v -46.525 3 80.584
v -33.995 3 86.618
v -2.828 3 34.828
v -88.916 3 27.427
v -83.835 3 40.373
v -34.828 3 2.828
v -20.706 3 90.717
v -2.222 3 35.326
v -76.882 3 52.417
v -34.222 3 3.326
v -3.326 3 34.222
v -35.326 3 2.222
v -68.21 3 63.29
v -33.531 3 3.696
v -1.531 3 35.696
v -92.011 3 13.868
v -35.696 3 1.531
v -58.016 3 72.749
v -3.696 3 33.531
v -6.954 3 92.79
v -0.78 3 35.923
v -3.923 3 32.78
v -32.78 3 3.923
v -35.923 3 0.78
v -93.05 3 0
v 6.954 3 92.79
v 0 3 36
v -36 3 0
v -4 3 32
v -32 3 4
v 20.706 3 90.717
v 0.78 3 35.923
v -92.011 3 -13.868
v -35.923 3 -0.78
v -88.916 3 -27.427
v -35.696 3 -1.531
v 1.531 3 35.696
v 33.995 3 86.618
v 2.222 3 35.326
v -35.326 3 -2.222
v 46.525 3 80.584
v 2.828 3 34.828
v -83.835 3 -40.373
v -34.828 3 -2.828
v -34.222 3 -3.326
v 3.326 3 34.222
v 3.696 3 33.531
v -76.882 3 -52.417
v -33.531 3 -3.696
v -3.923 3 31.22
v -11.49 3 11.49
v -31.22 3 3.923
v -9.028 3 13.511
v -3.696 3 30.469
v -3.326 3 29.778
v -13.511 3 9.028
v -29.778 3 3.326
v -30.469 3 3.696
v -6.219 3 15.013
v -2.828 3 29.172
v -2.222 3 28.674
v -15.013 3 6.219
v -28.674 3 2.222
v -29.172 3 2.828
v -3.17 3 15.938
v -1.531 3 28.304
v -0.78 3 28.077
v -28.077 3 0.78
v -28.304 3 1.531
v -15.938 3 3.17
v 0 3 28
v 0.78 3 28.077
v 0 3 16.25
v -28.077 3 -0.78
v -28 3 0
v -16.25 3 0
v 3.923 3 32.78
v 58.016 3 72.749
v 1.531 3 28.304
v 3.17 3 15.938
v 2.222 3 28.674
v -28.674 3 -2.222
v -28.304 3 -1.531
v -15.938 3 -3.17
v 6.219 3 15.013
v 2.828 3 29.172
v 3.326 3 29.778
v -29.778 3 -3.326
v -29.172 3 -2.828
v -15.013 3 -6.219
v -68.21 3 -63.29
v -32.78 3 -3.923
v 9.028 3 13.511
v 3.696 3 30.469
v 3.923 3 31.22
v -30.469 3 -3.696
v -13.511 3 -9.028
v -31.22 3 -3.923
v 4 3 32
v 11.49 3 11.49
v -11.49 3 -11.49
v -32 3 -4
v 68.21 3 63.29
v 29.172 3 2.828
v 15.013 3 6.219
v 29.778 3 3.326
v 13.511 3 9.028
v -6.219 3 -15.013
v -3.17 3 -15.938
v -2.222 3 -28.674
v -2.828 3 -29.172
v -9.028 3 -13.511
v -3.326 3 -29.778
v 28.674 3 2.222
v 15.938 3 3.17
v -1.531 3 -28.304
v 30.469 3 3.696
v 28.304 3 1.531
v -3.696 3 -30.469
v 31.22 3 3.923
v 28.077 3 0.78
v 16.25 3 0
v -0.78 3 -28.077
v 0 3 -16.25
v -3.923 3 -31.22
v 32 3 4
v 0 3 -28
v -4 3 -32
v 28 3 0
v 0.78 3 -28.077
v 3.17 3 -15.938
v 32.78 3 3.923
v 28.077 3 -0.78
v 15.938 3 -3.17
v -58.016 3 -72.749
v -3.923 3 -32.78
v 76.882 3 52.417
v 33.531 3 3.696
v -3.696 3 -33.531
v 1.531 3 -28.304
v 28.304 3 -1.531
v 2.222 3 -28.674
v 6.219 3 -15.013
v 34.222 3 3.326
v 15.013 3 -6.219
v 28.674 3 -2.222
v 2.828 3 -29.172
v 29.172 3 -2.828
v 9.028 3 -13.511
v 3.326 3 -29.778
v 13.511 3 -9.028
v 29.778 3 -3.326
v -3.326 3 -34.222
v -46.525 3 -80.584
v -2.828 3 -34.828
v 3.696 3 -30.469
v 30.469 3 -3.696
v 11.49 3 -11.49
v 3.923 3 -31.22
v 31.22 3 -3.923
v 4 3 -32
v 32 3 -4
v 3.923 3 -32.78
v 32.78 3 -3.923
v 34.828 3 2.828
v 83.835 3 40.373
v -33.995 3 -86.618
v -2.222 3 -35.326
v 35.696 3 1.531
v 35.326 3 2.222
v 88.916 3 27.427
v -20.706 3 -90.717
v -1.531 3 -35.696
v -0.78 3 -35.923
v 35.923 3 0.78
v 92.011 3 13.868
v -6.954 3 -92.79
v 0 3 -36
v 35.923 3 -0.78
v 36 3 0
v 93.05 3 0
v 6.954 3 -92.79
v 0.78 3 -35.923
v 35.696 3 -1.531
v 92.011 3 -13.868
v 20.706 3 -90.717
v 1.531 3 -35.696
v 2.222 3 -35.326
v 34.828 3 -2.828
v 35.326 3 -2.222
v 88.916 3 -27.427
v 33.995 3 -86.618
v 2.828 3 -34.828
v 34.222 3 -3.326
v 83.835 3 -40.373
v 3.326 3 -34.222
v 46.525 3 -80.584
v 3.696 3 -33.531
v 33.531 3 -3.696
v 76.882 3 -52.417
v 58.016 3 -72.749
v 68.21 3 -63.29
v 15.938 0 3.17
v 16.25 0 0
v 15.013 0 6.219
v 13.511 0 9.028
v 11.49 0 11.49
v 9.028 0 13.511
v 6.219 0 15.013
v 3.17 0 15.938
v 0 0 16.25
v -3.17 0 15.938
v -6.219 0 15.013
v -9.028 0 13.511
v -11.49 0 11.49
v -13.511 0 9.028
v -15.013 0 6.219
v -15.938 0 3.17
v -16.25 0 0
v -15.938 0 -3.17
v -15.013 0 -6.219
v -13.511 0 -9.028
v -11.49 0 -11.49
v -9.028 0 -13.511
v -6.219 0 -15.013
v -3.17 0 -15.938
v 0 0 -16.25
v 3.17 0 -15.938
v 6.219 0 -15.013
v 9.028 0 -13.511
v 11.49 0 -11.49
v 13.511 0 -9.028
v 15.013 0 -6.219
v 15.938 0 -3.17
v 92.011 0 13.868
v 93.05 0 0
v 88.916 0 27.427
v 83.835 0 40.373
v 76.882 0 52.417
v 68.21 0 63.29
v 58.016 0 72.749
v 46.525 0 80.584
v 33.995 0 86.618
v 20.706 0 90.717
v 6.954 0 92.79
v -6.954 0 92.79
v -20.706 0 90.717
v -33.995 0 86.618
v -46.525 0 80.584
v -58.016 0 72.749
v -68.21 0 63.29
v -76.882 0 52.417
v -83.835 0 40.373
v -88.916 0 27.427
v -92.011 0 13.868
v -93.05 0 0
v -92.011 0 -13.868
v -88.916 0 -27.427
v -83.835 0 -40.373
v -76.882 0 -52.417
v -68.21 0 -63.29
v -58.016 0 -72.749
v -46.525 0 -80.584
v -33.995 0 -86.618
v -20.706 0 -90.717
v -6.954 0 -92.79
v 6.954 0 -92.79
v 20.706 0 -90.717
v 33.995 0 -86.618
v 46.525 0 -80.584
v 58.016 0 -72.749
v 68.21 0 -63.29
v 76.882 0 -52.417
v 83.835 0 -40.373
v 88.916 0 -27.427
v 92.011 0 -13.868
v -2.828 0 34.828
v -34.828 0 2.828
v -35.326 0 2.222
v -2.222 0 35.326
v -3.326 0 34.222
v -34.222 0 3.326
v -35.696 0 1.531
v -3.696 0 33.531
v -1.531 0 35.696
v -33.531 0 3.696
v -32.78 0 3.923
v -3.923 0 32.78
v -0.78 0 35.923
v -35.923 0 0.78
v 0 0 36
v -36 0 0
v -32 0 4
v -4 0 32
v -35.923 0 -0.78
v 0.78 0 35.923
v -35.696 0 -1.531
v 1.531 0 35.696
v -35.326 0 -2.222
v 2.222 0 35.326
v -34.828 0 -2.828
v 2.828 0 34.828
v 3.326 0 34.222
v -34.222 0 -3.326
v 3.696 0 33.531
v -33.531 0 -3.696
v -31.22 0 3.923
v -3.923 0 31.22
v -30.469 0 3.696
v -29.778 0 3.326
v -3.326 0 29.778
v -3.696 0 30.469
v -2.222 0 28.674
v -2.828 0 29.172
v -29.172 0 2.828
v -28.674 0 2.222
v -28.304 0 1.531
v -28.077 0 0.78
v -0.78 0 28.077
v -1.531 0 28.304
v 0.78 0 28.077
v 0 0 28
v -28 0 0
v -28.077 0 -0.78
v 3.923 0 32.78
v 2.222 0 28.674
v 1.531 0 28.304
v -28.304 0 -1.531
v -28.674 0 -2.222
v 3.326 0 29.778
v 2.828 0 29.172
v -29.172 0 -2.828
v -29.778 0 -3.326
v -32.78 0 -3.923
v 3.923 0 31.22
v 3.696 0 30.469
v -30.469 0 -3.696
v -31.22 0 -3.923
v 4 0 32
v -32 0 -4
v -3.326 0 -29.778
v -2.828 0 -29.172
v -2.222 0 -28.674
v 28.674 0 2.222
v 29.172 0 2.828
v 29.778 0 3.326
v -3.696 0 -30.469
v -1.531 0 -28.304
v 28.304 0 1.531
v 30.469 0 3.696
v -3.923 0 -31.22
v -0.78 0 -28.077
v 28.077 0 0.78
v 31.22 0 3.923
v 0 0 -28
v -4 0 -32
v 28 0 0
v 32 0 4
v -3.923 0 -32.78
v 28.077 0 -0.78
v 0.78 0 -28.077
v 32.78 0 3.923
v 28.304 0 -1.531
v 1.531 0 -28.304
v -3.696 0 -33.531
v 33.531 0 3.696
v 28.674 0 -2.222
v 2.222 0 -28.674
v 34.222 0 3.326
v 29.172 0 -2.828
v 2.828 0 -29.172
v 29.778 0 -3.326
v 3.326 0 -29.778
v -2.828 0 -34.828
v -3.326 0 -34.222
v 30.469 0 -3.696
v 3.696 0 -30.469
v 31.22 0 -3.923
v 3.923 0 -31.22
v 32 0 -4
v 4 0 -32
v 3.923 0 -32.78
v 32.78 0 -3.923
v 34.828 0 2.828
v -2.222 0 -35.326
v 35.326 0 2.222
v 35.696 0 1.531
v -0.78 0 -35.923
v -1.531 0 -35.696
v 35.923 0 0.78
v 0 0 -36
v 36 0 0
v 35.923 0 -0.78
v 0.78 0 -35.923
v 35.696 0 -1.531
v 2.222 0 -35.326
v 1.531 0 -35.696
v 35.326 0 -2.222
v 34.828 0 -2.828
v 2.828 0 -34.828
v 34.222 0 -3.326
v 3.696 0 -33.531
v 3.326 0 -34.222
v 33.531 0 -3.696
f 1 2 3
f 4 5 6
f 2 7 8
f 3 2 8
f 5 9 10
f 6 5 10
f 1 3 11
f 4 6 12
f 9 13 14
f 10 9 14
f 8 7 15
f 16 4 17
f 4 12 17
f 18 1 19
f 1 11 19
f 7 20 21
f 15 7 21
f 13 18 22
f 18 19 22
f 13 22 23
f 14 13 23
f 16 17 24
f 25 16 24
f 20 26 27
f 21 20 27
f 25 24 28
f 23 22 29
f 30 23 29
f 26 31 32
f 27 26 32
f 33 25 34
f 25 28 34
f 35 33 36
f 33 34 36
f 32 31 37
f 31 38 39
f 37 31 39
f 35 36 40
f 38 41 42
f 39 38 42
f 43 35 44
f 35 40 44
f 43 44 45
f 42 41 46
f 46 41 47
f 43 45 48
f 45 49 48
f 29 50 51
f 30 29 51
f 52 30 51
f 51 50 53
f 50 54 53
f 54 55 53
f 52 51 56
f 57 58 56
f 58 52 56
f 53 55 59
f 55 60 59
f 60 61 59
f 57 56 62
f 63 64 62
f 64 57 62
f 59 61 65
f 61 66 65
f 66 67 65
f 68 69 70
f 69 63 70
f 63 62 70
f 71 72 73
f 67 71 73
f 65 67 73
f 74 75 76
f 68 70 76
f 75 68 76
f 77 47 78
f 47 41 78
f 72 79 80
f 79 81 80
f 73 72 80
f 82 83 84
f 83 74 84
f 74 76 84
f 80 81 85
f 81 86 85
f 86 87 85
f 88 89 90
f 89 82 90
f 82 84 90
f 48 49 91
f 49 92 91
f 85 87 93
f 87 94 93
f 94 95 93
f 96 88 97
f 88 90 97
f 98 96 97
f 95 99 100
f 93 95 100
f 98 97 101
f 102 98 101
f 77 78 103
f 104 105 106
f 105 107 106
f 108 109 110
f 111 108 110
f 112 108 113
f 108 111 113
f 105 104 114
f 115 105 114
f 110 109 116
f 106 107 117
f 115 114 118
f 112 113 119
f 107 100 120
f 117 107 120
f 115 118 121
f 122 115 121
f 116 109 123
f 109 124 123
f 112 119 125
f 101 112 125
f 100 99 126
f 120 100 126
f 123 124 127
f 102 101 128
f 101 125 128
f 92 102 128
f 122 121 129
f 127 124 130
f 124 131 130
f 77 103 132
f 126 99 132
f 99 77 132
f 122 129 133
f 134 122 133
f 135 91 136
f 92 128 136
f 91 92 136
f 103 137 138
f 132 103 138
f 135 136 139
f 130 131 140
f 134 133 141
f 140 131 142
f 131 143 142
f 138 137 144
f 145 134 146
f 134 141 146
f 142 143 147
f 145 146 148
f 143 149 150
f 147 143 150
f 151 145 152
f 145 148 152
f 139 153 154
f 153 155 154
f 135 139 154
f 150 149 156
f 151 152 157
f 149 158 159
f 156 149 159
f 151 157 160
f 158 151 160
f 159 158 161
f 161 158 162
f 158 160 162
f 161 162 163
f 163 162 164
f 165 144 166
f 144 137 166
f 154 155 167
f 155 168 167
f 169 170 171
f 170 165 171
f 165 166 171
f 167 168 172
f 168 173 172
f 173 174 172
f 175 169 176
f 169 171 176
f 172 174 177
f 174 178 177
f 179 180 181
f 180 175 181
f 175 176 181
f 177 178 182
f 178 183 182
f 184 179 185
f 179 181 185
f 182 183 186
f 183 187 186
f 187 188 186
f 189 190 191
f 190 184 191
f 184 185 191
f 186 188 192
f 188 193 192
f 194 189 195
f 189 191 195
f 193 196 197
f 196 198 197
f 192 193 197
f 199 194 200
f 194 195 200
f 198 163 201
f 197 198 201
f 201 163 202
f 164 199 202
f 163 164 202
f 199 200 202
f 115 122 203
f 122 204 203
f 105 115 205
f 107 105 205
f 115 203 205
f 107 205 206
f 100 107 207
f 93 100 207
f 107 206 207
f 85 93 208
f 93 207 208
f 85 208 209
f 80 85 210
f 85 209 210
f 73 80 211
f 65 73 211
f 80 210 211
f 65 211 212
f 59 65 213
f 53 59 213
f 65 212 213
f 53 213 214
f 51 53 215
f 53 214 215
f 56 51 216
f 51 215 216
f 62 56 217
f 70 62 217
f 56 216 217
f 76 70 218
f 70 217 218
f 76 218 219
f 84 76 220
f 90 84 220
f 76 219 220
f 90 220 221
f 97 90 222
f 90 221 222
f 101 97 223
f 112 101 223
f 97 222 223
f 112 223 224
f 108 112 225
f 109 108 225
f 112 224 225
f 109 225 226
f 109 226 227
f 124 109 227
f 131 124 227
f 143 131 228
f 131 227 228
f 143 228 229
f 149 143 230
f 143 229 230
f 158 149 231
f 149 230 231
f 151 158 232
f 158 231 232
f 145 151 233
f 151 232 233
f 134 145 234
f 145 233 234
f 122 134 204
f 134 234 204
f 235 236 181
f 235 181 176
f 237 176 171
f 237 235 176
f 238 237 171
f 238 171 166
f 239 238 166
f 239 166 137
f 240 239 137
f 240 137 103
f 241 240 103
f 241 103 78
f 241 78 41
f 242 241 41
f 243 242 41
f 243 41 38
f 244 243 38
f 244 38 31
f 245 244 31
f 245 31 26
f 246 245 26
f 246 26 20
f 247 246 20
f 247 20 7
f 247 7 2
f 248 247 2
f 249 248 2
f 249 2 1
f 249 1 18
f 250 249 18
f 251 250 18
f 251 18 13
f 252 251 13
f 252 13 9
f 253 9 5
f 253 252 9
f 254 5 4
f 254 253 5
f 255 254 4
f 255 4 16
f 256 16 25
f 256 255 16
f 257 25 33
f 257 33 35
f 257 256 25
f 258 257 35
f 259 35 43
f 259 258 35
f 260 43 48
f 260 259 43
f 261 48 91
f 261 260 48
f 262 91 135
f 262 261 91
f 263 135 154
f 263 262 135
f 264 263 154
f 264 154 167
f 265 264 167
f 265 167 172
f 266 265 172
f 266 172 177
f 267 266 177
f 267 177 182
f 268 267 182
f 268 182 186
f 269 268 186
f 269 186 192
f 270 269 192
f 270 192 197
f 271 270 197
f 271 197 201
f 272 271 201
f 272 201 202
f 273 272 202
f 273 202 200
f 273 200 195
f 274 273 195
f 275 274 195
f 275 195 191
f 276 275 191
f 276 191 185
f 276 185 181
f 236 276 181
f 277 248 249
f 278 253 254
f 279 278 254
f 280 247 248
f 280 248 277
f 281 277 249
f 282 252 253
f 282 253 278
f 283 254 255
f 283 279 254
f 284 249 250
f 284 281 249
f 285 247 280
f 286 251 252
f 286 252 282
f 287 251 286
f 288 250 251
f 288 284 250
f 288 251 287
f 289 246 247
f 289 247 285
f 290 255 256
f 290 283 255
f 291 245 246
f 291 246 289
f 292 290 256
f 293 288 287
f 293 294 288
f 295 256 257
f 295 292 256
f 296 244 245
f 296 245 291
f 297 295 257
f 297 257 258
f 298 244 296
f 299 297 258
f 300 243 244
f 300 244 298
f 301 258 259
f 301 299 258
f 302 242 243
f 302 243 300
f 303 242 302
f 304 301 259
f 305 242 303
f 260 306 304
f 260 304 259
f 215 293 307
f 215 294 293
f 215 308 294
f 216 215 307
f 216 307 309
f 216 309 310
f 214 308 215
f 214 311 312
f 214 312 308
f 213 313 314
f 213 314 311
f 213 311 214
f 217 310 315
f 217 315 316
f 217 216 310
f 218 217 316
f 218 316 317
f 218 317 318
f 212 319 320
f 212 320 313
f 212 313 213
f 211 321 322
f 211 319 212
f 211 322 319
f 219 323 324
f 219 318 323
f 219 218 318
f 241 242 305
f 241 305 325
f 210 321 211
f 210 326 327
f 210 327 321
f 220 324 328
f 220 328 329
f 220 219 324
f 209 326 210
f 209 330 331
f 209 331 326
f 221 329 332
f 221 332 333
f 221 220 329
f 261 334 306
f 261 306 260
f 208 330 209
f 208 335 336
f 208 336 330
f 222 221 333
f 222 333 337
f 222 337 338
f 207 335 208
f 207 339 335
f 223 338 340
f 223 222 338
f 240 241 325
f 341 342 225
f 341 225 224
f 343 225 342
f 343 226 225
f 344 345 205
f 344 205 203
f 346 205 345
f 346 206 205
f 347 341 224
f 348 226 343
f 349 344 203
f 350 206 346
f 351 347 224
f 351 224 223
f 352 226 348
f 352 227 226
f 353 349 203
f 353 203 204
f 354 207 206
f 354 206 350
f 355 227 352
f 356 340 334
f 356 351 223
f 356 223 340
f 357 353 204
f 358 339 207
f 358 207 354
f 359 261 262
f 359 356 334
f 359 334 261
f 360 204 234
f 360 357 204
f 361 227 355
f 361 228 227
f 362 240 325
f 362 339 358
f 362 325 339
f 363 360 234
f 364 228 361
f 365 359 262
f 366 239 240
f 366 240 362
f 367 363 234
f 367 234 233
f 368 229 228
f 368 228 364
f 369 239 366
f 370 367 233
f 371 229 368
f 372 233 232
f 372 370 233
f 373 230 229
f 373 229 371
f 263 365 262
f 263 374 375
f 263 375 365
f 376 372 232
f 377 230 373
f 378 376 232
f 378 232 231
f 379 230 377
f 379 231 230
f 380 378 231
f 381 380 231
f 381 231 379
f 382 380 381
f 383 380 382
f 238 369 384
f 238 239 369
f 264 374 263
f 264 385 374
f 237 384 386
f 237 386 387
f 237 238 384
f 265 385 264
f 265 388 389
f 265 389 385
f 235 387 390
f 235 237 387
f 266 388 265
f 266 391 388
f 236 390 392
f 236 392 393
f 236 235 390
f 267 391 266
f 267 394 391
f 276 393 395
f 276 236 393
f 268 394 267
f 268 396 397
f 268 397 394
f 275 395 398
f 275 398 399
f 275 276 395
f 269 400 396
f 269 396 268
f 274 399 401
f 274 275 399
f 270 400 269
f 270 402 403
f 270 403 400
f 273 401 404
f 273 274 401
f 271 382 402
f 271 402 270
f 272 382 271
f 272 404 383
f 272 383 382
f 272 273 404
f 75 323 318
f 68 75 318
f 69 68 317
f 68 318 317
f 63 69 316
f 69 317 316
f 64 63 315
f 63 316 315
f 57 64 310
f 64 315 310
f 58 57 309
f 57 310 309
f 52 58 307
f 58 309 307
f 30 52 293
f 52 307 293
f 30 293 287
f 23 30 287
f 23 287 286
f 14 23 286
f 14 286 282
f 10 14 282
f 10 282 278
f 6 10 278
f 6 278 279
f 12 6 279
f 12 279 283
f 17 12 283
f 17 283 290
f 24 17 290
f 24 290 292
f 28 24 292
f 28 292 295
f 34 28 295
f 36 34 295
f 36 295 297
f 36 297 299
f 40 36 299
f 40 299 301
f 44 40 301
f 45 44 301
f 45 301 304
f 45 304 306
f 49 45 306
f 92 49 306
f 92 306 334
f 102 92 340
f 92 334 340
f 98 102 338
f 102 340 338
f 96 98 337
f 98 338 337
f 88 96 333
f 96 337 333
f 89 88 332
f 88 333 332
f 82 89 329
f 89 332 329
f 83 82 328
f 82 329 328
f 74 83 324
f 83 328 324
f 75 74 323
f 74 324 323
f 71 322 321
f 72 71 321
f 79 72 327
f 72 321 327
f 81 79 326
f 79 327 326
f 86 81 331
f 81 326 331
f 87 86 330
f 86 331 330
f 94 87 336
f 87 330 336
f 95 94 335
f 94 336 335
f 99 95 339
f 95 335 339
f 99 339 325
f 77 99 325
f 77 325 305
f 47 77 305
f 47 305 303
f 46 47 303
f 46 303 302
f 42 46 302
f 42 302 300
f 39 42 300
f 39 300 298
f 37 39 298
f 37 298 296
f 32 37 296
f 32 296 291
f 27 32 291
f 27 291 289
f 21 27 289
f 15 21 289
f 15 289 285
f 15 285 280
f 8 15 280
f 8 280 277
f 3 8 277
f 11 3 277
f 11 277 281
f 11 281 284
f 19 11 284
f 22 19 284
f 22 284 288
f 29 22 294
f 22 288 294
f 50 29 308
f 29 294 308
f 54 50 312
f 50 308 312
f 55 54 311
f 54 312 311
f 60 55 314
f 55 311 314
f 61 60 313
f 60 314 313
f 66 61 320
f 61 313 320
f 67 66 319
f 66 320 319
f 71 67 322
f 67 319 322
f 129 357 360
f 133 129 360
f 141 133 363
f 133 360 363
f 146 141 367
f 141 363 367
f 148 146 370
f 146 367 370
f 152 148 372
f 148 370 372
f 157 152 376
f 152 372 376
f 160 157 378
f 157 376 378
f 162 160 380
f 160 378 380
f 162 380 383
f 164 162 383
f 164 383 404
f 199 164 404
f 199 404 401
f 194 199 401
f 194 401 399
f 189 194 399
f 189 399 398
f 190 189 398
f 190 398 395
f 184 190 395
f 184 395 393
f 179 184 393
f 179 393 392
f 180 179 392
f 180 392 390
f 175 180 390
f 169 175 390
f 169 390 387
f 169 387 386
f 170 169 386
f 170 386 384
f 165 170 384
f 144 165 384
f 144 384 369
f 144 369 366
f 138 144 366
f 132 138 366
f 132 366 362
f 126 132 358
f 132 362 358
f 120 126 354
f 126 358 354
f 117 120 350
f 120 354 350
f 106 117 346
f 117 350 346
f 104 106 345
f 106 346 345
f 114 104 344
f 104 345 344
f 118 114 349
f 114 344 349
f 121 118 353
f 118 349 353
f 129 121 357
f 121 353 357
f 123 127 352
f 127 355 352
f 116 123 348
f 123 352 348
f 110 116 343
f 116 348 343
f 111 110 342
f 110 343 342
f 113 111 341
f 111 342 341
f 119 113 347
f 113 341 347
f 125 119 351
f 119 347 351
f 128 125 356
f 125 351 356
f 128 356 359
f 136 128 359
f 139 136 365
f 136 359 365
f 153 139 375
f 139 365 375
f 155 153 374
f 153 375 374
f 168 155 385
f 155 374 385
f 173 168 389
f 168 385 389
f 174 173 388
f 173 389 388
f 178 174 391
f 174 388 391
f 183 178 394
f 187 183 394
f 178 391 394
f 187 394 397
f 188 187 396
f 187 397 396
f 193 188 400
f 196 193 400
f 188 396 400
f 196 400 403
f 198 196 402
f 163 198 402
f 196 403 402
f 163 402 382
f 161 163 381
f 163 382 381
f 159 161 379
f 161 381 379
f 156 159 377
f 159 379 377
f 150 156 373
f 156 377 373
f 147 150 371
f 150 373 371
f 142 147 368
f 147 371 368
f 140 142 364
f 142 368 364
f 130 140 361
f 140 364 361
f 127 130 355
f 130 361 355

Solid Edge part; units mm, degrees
sketch "Sketch1" plane through (0, 0, 0) normal (0, -1, 0) x (1, 0, 0)
  circle A0 centre (0, 0) radius 93.05
  circle A1 centre (0, 0) radius 16.25
  dimension "D1" = 32.5
  dimension "D2" = 186.1
extrude "Protrusion1" add sketch "Sketch1" against normal blind 3
hole "Hole_1" at (0, 0, 32) direction (0, 1, 0) diameter 8 end up to next
pattern_circular "Pattern2" count 4 over 360 about axis through (0, 0, 0) along (0, 1, 0) of "Hole_1"
